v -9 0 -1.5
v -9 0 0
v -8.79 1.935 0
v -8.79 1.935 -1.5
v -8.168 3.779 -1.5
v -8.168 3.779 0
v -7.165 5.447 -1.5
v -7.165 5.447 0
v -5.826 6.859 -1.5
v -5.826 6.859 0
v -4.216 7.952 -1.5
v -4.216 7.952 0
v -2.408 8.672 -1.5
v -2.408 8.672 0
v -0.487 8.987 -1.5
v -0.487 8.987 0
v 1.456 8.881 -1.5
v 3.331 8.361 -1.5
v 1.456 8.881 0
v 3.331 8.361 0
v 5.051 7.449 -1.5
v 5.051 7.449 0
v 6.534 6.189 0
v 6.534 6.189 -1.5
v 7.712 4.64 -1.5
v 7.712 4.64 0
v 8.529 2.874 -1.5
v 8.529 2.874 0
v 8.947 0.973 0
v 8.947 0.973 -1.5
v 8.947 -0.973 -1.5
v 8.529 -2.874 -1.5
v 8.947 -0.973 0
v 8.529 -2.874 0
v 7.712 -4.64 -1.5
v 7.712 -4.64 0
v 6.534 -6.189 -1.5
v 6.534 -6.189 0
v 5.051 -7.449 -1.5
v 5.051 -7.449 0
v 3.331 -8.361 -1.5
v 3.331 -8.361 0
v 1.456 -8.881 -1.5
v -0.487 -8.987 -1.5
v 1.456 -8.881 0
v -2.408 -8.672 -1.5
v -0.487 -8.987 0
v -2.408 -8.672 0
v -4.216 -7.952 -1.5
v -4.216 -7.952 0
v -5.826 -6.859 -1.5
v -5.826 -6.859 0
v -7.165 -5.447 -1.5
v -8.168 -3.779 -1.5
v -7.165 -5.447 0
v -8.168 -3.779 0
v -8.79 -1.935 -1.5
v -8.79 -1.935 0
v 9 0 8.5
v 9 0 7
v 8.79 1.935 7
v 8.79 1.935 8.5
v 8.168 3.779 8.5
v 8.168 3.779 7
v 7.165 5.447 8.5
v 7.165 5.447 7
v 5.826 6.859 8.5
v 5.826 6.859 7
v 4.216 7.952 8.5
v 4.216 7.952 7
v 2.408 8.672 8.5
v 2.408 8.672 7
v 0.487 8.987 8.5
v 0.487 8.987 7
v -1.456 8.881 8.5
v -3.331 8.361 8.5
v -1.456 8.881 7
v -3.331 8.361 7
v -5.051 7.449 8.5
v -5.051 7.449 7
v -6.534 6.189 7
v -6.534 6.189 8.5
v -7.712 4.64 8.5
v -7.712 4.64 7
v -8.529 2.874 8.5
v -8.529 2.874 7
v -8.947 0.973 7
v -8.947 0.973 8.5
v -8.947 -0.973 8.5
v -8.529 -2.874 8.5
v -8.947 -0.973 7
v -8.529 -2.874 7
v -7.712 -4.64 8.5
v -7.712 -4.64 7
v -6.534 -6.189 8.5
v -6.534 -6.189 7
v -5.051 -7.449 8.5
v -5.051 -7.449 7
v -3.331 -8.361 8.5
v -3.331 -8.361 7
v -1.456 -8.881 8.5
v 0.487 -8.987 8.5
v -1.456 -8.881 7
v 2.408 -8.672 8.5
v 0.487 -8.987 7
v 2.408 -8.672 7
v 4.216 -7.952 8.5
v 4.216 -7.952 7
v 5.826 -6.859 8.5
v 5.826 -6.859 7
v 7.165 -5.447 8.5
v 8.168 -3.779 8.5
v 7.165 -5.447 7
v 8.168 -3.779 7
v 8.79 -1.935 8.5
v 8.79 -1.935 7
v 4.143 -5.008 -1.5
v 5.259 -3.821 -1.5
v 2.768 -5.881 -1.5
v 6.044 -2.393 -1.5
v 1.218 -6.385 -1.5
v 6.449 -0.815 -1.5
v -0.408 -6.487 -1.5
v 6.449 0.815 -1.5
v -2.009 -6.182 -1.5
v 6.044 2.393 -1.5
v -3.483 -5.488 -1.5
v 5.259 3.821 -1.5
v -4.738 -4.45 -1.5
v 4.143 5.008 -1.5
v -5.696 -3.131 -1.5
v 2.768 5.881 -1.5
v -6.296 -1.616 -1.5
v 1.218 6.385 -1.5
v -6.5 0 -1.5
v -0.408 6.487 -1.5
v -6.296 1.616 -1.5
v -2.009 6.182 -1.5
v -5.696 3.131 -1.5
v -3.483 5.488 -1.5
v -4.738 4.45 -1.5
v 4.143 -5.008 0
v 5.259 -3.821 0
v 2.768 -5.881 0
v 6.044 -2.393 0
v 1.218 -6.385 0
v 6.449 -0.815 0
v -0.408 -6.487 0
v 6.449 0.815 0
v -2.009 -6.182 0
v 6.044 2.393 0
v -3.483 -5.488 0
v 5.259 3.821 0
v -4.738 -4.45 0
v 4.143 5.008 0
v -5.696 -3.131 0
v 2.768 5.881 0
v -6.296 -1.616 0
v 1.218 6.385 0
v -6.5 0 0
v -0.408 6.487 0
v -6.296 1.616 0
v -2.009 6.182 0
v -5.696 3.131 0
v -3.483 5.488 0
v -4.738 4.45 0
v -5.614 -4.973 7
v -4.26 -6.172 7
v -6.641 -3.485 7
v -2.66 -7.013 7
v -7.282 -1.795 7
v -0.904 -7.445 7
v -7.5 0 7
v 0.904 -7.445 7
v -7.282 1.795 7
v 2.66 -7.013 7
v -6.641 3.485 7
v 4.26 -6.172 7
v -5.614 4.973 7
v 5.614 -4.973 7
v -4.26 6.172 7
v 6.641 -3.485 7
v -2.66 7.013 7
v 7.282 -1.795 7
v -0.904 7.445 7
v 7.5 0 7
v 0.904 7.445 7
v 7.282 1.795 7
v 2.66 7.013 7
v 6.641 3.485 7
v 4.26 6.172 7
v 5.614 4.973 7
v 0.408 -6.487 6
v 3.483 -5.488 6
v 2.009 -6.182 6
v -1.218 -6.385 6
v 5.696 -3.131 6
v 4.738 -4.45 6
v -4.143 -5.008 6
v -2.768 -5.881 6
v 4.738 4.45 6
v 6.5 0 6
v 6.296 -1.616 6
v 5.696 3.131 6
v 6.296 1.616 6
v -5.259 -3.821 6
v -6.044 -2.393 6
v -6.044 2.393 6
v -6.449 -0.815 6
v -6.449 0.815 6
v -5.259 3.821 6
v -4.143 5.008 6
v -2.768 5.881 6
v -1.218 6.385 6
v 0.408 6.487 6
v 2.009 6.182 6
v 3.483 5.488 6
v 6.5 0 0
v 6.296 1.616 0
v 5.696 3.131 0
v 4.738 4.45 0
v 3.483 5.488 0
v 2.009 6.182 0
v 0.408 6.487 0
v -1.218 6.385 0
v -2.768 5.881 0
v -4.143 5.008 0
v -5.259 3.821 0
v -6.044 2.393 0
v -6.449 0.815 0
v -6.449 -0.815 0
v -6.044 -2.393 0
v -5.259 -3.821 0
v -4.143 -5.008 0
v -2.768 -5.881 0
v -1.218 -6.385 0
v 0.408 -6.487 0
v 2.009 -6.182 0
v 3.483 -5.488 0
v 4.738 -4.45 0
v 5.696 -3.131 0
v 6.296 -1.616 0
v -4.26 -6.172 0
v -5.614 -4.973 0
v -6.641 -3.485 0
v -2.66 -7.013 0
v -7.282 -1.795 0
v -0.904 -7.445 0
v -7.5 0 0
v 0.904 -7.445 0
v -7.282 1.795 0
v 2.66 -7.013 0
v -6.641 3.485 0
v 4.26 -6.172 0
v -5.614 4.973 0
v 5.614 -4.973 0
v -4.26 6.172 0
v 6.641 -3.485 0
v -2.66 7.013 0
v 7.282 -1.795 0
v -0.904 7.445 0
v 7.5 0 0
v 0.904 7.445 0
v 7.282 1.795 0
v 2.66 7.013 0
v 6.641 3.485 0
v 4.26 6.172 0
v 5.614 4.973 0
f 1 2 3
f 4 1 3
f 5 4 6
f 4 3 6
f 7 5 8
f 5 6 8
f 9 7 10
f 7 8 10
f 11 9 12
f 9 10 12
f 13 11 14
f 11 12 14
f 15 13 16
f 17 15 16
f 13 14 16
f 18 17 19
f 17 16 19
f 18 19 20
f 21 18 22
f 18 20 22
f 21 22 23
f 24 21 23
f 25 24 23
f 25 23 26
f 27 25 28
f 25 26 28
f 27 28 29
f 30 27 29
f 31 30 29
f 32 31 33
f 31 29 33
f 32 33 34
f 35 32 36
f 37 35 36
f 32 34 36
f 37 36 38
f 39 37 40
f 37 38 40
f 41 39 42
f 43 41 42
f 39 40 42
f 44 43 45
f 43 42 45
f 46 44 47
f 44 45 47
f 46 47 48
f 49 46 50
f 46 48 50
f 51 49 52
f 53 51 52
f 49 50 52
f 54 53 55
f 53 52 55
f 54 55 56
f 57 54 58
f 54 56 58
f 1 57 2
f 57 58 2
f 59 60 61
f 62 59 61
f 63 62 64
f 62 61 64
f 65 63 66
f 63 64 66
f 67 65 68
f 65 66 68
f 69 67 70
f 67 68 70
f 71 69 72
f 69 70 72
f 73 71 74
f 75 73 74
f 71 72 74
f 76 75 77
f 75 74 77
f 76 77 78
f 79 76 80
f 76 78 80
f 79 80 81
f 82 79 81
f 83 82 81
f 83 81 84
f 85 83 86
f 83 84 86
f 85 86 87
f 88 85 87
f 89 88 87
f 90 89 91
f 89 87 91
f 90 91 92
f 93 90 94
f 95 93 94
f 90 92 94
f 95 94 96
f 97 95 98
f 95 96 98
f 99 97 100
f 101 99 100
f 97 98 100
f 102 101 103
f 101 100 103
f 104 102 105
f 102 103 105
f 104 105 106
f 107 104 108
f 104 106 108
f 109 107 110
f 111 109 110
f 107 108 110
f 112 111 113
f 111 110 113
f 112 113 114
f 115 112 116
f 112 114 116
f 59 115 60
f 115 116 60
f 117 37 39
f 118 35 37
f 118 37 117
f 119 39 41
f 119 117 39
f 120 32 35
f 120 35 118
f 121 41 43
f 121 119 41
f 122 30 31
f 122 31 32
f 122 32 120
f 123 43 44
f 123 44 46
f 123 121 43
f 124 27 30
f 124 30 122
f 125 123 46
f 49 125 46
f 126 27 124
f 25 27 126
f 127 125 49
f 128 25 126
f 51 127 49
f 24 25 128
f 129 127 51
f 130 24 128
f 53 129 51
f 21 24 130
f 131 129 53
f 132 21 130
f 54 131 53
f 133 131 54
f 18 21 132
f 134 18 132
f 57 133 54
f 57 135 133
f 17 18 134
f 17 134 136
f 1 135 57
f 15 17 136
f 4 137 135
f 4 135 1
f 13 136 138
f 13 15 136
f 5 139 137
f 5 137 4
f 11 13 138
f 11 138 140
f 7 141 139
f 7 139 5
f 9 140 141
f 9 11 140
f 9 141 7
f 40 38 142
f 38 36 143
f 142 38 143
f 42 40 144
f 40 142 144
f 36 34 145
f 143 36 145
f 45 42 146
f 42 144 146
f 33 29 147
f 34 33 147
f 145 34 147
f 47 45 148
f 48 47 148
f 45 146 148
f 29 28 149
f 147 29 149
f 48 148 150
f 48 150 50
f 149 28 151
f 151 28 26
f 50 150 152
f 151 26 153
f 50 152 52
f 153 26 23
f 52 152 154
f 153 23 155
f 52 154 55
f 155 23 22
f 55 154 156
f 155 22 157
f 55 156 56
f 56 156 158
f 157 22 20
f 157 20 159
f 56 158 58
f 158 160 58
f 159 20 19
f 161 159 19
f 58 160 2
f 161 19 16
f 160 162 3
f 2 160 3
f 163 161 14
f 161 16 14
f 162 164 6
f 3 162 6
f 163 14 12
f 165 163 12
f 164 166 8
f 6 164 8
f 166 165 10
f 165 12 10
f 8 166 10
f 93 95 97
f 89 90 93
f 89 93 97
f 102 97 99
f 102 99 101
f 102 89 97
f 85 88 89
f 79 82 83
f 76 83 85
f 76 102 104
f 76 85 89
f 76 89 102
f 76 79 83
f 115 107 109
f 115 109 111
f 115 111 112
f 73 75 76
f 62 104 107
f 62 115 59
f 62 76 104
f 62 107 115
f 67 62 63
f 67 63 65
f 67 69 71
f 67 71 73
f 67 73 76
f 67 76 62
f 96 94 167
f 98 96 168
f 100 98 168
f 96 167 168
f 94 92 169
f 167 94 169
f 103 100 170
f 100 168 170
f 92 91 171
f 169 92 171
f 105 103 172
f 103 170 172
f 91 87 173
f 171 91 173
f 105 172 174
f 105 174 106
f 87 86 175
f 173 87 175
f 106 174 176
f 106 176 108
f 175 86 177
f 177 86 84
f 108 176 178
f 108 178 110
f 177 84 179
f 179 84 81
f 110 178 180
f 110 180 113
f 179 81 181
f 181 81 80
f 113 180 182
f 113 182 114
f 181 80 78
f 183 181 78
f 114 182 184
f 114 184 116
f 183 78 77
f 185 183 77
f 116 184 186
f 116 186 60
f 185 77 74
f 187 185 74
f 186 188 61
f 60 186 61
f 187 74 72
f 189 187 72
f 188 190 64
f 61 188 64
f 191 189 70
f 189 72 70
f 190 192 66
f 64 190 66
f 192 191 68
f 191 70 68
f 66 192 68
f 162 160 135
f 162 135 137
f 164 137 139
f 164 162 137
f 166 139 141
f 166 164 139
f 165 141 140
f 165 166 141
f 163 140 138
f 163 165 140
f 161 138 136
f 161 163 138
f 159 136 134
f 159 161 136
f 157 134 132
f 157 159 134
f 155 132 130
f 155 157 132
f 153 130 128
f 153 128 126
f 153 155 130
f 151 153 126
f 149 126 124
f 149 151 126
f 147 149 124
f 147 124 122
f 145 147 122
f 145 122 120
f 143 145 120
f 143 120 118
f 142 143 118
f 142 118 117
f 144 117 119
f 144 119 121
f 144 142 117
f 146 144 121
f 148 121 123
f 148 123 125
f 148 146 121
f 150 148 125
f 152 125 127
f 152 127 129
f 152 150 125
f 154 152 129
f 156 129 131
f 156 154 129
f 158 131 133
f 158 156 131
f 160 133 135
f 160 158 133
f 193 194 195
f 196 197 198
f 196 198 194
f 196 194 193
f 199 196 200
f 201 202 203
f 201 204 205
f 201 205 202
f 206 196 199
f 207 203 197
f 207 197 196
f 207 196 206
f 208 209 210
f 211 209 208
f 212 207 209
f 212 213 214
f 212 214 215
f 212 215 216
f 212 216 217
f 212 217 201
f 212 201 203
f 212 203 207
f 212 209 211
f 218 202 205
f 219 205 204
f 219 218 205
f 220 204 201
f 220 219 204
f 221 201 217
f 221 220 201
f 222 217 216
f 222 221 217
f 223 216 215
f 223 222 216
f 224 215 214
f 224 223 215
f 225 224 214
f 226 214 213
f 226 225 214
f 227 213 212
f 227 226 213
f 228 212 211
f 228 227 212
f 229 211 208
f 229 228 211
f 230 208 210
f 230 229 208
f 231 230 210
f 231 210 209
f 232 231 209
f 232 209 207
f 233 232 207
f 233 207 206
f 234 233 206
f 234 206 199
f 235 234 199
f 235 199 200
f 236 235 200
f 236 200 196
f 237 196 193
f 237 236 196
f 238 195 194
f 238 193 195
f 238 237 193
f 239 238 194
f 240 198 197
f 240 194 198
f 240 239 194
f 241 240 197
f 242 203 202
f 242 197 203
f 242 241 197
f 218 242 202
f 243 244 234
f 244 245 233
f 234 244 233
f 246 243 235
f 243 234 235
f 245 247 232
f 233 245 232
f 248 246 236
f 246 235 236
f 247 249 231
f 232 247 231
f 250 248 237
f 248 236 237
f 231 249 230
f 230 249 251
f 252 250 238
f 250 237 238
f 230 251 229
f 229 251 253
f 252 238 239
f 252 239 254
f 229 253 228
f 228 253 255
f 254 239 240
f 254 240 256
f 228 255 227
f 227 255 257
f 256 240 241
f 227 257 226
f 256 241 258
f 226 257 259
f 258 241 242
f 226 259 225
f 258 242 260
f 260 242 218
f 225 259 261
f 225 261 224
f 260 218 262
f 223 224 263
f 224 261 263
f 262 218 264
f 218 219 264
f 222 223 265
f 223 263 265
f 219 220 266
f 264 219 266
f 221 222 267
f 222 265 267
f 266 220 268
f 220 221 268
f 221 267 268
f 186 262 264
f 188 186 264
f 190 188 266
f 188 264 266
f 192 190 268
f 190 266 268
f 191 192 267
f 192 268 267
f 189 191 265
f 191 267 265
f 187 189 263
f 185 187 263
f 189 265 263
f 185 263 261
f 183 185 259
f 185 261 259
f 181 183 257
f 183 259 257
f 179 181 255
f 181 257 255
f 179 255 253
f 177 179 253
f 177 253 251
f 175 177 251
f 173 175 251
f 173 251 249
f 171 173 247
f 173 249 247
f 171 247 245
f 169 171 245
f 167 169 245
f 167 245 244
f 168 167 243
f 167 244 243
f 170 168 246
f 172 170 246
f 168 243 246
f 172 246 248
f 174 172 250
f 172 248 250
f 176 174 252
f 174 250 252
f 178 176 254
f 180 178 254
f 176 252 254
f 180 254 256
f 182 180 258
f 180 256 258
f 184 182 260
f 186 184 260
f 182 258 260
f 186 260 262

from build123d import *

# Parameters (mm, degrees)
SKETCH1_R           = 7.5
SKETCH1_R_2         = 6.5
BOSS_EXTRUDE2_DEPTH = 7
SKETCH3_R           = 9
BOSS_EXTRUDE3_DEPTH = 1.5
SKETCH4_R           = 9
SKETCH4_R_2         = 6.5
BOSS_EXTRUDE4_DEPTH = 1.5
BOSS_EXTRUDE5_START = 1
SKETCH5_R           = 6.5
BOSS_EXTRUDE5_DEPTH = 1


with BuildPart() as part:
    # Sketch1 → Boss-Extrude2 (new body)
    with BuildSketch(Plane.XY):
        Circle(SKETCH1_R)
        Circle(SKETCH1_R_2, mode=Mode.SUBTRACT)
    extrude(amount=BOSS_EXTRUDE2_DEPTH)

    # Sketch3 → Boss-Extrude3 (add)
    with BuildSketch(Plane.XY.offset(7)):
        Circle(SKETCH3_R)
    extrude(amount=BOSS_EXTRUDE3_DEPTH)

    # Sketch5 → Boss-Extrude5 (add)
    with BuildSketch(Plane(origin=(0, 0, 7), x_dir=(-1, 0, 0), z_dir=(0, 0, -1)).offset(BOSS_EXTRUDE5_START)):
        Circle(SKETCH5_R)
    extrude(amount=-BOSS_EXTRUDE5_DEPTH)


with BuildPart() as body_2:
    # Sketch4 → Boss-Extrude4 (new body)
    with BuildSketch(Plane(origin=(0, 0, 0), x_dir=(-1, 0, 0), z_dir=(0, 0, -1))):
        Circle(SKETCH4_R)
        Circle(SKETCH4_R_2, mode=Mode.SUBTRACT)
    extrude(amount=BOSS_EXTRUDE4_DEPTH)


solid = Compound([part.part, body_2.part])
